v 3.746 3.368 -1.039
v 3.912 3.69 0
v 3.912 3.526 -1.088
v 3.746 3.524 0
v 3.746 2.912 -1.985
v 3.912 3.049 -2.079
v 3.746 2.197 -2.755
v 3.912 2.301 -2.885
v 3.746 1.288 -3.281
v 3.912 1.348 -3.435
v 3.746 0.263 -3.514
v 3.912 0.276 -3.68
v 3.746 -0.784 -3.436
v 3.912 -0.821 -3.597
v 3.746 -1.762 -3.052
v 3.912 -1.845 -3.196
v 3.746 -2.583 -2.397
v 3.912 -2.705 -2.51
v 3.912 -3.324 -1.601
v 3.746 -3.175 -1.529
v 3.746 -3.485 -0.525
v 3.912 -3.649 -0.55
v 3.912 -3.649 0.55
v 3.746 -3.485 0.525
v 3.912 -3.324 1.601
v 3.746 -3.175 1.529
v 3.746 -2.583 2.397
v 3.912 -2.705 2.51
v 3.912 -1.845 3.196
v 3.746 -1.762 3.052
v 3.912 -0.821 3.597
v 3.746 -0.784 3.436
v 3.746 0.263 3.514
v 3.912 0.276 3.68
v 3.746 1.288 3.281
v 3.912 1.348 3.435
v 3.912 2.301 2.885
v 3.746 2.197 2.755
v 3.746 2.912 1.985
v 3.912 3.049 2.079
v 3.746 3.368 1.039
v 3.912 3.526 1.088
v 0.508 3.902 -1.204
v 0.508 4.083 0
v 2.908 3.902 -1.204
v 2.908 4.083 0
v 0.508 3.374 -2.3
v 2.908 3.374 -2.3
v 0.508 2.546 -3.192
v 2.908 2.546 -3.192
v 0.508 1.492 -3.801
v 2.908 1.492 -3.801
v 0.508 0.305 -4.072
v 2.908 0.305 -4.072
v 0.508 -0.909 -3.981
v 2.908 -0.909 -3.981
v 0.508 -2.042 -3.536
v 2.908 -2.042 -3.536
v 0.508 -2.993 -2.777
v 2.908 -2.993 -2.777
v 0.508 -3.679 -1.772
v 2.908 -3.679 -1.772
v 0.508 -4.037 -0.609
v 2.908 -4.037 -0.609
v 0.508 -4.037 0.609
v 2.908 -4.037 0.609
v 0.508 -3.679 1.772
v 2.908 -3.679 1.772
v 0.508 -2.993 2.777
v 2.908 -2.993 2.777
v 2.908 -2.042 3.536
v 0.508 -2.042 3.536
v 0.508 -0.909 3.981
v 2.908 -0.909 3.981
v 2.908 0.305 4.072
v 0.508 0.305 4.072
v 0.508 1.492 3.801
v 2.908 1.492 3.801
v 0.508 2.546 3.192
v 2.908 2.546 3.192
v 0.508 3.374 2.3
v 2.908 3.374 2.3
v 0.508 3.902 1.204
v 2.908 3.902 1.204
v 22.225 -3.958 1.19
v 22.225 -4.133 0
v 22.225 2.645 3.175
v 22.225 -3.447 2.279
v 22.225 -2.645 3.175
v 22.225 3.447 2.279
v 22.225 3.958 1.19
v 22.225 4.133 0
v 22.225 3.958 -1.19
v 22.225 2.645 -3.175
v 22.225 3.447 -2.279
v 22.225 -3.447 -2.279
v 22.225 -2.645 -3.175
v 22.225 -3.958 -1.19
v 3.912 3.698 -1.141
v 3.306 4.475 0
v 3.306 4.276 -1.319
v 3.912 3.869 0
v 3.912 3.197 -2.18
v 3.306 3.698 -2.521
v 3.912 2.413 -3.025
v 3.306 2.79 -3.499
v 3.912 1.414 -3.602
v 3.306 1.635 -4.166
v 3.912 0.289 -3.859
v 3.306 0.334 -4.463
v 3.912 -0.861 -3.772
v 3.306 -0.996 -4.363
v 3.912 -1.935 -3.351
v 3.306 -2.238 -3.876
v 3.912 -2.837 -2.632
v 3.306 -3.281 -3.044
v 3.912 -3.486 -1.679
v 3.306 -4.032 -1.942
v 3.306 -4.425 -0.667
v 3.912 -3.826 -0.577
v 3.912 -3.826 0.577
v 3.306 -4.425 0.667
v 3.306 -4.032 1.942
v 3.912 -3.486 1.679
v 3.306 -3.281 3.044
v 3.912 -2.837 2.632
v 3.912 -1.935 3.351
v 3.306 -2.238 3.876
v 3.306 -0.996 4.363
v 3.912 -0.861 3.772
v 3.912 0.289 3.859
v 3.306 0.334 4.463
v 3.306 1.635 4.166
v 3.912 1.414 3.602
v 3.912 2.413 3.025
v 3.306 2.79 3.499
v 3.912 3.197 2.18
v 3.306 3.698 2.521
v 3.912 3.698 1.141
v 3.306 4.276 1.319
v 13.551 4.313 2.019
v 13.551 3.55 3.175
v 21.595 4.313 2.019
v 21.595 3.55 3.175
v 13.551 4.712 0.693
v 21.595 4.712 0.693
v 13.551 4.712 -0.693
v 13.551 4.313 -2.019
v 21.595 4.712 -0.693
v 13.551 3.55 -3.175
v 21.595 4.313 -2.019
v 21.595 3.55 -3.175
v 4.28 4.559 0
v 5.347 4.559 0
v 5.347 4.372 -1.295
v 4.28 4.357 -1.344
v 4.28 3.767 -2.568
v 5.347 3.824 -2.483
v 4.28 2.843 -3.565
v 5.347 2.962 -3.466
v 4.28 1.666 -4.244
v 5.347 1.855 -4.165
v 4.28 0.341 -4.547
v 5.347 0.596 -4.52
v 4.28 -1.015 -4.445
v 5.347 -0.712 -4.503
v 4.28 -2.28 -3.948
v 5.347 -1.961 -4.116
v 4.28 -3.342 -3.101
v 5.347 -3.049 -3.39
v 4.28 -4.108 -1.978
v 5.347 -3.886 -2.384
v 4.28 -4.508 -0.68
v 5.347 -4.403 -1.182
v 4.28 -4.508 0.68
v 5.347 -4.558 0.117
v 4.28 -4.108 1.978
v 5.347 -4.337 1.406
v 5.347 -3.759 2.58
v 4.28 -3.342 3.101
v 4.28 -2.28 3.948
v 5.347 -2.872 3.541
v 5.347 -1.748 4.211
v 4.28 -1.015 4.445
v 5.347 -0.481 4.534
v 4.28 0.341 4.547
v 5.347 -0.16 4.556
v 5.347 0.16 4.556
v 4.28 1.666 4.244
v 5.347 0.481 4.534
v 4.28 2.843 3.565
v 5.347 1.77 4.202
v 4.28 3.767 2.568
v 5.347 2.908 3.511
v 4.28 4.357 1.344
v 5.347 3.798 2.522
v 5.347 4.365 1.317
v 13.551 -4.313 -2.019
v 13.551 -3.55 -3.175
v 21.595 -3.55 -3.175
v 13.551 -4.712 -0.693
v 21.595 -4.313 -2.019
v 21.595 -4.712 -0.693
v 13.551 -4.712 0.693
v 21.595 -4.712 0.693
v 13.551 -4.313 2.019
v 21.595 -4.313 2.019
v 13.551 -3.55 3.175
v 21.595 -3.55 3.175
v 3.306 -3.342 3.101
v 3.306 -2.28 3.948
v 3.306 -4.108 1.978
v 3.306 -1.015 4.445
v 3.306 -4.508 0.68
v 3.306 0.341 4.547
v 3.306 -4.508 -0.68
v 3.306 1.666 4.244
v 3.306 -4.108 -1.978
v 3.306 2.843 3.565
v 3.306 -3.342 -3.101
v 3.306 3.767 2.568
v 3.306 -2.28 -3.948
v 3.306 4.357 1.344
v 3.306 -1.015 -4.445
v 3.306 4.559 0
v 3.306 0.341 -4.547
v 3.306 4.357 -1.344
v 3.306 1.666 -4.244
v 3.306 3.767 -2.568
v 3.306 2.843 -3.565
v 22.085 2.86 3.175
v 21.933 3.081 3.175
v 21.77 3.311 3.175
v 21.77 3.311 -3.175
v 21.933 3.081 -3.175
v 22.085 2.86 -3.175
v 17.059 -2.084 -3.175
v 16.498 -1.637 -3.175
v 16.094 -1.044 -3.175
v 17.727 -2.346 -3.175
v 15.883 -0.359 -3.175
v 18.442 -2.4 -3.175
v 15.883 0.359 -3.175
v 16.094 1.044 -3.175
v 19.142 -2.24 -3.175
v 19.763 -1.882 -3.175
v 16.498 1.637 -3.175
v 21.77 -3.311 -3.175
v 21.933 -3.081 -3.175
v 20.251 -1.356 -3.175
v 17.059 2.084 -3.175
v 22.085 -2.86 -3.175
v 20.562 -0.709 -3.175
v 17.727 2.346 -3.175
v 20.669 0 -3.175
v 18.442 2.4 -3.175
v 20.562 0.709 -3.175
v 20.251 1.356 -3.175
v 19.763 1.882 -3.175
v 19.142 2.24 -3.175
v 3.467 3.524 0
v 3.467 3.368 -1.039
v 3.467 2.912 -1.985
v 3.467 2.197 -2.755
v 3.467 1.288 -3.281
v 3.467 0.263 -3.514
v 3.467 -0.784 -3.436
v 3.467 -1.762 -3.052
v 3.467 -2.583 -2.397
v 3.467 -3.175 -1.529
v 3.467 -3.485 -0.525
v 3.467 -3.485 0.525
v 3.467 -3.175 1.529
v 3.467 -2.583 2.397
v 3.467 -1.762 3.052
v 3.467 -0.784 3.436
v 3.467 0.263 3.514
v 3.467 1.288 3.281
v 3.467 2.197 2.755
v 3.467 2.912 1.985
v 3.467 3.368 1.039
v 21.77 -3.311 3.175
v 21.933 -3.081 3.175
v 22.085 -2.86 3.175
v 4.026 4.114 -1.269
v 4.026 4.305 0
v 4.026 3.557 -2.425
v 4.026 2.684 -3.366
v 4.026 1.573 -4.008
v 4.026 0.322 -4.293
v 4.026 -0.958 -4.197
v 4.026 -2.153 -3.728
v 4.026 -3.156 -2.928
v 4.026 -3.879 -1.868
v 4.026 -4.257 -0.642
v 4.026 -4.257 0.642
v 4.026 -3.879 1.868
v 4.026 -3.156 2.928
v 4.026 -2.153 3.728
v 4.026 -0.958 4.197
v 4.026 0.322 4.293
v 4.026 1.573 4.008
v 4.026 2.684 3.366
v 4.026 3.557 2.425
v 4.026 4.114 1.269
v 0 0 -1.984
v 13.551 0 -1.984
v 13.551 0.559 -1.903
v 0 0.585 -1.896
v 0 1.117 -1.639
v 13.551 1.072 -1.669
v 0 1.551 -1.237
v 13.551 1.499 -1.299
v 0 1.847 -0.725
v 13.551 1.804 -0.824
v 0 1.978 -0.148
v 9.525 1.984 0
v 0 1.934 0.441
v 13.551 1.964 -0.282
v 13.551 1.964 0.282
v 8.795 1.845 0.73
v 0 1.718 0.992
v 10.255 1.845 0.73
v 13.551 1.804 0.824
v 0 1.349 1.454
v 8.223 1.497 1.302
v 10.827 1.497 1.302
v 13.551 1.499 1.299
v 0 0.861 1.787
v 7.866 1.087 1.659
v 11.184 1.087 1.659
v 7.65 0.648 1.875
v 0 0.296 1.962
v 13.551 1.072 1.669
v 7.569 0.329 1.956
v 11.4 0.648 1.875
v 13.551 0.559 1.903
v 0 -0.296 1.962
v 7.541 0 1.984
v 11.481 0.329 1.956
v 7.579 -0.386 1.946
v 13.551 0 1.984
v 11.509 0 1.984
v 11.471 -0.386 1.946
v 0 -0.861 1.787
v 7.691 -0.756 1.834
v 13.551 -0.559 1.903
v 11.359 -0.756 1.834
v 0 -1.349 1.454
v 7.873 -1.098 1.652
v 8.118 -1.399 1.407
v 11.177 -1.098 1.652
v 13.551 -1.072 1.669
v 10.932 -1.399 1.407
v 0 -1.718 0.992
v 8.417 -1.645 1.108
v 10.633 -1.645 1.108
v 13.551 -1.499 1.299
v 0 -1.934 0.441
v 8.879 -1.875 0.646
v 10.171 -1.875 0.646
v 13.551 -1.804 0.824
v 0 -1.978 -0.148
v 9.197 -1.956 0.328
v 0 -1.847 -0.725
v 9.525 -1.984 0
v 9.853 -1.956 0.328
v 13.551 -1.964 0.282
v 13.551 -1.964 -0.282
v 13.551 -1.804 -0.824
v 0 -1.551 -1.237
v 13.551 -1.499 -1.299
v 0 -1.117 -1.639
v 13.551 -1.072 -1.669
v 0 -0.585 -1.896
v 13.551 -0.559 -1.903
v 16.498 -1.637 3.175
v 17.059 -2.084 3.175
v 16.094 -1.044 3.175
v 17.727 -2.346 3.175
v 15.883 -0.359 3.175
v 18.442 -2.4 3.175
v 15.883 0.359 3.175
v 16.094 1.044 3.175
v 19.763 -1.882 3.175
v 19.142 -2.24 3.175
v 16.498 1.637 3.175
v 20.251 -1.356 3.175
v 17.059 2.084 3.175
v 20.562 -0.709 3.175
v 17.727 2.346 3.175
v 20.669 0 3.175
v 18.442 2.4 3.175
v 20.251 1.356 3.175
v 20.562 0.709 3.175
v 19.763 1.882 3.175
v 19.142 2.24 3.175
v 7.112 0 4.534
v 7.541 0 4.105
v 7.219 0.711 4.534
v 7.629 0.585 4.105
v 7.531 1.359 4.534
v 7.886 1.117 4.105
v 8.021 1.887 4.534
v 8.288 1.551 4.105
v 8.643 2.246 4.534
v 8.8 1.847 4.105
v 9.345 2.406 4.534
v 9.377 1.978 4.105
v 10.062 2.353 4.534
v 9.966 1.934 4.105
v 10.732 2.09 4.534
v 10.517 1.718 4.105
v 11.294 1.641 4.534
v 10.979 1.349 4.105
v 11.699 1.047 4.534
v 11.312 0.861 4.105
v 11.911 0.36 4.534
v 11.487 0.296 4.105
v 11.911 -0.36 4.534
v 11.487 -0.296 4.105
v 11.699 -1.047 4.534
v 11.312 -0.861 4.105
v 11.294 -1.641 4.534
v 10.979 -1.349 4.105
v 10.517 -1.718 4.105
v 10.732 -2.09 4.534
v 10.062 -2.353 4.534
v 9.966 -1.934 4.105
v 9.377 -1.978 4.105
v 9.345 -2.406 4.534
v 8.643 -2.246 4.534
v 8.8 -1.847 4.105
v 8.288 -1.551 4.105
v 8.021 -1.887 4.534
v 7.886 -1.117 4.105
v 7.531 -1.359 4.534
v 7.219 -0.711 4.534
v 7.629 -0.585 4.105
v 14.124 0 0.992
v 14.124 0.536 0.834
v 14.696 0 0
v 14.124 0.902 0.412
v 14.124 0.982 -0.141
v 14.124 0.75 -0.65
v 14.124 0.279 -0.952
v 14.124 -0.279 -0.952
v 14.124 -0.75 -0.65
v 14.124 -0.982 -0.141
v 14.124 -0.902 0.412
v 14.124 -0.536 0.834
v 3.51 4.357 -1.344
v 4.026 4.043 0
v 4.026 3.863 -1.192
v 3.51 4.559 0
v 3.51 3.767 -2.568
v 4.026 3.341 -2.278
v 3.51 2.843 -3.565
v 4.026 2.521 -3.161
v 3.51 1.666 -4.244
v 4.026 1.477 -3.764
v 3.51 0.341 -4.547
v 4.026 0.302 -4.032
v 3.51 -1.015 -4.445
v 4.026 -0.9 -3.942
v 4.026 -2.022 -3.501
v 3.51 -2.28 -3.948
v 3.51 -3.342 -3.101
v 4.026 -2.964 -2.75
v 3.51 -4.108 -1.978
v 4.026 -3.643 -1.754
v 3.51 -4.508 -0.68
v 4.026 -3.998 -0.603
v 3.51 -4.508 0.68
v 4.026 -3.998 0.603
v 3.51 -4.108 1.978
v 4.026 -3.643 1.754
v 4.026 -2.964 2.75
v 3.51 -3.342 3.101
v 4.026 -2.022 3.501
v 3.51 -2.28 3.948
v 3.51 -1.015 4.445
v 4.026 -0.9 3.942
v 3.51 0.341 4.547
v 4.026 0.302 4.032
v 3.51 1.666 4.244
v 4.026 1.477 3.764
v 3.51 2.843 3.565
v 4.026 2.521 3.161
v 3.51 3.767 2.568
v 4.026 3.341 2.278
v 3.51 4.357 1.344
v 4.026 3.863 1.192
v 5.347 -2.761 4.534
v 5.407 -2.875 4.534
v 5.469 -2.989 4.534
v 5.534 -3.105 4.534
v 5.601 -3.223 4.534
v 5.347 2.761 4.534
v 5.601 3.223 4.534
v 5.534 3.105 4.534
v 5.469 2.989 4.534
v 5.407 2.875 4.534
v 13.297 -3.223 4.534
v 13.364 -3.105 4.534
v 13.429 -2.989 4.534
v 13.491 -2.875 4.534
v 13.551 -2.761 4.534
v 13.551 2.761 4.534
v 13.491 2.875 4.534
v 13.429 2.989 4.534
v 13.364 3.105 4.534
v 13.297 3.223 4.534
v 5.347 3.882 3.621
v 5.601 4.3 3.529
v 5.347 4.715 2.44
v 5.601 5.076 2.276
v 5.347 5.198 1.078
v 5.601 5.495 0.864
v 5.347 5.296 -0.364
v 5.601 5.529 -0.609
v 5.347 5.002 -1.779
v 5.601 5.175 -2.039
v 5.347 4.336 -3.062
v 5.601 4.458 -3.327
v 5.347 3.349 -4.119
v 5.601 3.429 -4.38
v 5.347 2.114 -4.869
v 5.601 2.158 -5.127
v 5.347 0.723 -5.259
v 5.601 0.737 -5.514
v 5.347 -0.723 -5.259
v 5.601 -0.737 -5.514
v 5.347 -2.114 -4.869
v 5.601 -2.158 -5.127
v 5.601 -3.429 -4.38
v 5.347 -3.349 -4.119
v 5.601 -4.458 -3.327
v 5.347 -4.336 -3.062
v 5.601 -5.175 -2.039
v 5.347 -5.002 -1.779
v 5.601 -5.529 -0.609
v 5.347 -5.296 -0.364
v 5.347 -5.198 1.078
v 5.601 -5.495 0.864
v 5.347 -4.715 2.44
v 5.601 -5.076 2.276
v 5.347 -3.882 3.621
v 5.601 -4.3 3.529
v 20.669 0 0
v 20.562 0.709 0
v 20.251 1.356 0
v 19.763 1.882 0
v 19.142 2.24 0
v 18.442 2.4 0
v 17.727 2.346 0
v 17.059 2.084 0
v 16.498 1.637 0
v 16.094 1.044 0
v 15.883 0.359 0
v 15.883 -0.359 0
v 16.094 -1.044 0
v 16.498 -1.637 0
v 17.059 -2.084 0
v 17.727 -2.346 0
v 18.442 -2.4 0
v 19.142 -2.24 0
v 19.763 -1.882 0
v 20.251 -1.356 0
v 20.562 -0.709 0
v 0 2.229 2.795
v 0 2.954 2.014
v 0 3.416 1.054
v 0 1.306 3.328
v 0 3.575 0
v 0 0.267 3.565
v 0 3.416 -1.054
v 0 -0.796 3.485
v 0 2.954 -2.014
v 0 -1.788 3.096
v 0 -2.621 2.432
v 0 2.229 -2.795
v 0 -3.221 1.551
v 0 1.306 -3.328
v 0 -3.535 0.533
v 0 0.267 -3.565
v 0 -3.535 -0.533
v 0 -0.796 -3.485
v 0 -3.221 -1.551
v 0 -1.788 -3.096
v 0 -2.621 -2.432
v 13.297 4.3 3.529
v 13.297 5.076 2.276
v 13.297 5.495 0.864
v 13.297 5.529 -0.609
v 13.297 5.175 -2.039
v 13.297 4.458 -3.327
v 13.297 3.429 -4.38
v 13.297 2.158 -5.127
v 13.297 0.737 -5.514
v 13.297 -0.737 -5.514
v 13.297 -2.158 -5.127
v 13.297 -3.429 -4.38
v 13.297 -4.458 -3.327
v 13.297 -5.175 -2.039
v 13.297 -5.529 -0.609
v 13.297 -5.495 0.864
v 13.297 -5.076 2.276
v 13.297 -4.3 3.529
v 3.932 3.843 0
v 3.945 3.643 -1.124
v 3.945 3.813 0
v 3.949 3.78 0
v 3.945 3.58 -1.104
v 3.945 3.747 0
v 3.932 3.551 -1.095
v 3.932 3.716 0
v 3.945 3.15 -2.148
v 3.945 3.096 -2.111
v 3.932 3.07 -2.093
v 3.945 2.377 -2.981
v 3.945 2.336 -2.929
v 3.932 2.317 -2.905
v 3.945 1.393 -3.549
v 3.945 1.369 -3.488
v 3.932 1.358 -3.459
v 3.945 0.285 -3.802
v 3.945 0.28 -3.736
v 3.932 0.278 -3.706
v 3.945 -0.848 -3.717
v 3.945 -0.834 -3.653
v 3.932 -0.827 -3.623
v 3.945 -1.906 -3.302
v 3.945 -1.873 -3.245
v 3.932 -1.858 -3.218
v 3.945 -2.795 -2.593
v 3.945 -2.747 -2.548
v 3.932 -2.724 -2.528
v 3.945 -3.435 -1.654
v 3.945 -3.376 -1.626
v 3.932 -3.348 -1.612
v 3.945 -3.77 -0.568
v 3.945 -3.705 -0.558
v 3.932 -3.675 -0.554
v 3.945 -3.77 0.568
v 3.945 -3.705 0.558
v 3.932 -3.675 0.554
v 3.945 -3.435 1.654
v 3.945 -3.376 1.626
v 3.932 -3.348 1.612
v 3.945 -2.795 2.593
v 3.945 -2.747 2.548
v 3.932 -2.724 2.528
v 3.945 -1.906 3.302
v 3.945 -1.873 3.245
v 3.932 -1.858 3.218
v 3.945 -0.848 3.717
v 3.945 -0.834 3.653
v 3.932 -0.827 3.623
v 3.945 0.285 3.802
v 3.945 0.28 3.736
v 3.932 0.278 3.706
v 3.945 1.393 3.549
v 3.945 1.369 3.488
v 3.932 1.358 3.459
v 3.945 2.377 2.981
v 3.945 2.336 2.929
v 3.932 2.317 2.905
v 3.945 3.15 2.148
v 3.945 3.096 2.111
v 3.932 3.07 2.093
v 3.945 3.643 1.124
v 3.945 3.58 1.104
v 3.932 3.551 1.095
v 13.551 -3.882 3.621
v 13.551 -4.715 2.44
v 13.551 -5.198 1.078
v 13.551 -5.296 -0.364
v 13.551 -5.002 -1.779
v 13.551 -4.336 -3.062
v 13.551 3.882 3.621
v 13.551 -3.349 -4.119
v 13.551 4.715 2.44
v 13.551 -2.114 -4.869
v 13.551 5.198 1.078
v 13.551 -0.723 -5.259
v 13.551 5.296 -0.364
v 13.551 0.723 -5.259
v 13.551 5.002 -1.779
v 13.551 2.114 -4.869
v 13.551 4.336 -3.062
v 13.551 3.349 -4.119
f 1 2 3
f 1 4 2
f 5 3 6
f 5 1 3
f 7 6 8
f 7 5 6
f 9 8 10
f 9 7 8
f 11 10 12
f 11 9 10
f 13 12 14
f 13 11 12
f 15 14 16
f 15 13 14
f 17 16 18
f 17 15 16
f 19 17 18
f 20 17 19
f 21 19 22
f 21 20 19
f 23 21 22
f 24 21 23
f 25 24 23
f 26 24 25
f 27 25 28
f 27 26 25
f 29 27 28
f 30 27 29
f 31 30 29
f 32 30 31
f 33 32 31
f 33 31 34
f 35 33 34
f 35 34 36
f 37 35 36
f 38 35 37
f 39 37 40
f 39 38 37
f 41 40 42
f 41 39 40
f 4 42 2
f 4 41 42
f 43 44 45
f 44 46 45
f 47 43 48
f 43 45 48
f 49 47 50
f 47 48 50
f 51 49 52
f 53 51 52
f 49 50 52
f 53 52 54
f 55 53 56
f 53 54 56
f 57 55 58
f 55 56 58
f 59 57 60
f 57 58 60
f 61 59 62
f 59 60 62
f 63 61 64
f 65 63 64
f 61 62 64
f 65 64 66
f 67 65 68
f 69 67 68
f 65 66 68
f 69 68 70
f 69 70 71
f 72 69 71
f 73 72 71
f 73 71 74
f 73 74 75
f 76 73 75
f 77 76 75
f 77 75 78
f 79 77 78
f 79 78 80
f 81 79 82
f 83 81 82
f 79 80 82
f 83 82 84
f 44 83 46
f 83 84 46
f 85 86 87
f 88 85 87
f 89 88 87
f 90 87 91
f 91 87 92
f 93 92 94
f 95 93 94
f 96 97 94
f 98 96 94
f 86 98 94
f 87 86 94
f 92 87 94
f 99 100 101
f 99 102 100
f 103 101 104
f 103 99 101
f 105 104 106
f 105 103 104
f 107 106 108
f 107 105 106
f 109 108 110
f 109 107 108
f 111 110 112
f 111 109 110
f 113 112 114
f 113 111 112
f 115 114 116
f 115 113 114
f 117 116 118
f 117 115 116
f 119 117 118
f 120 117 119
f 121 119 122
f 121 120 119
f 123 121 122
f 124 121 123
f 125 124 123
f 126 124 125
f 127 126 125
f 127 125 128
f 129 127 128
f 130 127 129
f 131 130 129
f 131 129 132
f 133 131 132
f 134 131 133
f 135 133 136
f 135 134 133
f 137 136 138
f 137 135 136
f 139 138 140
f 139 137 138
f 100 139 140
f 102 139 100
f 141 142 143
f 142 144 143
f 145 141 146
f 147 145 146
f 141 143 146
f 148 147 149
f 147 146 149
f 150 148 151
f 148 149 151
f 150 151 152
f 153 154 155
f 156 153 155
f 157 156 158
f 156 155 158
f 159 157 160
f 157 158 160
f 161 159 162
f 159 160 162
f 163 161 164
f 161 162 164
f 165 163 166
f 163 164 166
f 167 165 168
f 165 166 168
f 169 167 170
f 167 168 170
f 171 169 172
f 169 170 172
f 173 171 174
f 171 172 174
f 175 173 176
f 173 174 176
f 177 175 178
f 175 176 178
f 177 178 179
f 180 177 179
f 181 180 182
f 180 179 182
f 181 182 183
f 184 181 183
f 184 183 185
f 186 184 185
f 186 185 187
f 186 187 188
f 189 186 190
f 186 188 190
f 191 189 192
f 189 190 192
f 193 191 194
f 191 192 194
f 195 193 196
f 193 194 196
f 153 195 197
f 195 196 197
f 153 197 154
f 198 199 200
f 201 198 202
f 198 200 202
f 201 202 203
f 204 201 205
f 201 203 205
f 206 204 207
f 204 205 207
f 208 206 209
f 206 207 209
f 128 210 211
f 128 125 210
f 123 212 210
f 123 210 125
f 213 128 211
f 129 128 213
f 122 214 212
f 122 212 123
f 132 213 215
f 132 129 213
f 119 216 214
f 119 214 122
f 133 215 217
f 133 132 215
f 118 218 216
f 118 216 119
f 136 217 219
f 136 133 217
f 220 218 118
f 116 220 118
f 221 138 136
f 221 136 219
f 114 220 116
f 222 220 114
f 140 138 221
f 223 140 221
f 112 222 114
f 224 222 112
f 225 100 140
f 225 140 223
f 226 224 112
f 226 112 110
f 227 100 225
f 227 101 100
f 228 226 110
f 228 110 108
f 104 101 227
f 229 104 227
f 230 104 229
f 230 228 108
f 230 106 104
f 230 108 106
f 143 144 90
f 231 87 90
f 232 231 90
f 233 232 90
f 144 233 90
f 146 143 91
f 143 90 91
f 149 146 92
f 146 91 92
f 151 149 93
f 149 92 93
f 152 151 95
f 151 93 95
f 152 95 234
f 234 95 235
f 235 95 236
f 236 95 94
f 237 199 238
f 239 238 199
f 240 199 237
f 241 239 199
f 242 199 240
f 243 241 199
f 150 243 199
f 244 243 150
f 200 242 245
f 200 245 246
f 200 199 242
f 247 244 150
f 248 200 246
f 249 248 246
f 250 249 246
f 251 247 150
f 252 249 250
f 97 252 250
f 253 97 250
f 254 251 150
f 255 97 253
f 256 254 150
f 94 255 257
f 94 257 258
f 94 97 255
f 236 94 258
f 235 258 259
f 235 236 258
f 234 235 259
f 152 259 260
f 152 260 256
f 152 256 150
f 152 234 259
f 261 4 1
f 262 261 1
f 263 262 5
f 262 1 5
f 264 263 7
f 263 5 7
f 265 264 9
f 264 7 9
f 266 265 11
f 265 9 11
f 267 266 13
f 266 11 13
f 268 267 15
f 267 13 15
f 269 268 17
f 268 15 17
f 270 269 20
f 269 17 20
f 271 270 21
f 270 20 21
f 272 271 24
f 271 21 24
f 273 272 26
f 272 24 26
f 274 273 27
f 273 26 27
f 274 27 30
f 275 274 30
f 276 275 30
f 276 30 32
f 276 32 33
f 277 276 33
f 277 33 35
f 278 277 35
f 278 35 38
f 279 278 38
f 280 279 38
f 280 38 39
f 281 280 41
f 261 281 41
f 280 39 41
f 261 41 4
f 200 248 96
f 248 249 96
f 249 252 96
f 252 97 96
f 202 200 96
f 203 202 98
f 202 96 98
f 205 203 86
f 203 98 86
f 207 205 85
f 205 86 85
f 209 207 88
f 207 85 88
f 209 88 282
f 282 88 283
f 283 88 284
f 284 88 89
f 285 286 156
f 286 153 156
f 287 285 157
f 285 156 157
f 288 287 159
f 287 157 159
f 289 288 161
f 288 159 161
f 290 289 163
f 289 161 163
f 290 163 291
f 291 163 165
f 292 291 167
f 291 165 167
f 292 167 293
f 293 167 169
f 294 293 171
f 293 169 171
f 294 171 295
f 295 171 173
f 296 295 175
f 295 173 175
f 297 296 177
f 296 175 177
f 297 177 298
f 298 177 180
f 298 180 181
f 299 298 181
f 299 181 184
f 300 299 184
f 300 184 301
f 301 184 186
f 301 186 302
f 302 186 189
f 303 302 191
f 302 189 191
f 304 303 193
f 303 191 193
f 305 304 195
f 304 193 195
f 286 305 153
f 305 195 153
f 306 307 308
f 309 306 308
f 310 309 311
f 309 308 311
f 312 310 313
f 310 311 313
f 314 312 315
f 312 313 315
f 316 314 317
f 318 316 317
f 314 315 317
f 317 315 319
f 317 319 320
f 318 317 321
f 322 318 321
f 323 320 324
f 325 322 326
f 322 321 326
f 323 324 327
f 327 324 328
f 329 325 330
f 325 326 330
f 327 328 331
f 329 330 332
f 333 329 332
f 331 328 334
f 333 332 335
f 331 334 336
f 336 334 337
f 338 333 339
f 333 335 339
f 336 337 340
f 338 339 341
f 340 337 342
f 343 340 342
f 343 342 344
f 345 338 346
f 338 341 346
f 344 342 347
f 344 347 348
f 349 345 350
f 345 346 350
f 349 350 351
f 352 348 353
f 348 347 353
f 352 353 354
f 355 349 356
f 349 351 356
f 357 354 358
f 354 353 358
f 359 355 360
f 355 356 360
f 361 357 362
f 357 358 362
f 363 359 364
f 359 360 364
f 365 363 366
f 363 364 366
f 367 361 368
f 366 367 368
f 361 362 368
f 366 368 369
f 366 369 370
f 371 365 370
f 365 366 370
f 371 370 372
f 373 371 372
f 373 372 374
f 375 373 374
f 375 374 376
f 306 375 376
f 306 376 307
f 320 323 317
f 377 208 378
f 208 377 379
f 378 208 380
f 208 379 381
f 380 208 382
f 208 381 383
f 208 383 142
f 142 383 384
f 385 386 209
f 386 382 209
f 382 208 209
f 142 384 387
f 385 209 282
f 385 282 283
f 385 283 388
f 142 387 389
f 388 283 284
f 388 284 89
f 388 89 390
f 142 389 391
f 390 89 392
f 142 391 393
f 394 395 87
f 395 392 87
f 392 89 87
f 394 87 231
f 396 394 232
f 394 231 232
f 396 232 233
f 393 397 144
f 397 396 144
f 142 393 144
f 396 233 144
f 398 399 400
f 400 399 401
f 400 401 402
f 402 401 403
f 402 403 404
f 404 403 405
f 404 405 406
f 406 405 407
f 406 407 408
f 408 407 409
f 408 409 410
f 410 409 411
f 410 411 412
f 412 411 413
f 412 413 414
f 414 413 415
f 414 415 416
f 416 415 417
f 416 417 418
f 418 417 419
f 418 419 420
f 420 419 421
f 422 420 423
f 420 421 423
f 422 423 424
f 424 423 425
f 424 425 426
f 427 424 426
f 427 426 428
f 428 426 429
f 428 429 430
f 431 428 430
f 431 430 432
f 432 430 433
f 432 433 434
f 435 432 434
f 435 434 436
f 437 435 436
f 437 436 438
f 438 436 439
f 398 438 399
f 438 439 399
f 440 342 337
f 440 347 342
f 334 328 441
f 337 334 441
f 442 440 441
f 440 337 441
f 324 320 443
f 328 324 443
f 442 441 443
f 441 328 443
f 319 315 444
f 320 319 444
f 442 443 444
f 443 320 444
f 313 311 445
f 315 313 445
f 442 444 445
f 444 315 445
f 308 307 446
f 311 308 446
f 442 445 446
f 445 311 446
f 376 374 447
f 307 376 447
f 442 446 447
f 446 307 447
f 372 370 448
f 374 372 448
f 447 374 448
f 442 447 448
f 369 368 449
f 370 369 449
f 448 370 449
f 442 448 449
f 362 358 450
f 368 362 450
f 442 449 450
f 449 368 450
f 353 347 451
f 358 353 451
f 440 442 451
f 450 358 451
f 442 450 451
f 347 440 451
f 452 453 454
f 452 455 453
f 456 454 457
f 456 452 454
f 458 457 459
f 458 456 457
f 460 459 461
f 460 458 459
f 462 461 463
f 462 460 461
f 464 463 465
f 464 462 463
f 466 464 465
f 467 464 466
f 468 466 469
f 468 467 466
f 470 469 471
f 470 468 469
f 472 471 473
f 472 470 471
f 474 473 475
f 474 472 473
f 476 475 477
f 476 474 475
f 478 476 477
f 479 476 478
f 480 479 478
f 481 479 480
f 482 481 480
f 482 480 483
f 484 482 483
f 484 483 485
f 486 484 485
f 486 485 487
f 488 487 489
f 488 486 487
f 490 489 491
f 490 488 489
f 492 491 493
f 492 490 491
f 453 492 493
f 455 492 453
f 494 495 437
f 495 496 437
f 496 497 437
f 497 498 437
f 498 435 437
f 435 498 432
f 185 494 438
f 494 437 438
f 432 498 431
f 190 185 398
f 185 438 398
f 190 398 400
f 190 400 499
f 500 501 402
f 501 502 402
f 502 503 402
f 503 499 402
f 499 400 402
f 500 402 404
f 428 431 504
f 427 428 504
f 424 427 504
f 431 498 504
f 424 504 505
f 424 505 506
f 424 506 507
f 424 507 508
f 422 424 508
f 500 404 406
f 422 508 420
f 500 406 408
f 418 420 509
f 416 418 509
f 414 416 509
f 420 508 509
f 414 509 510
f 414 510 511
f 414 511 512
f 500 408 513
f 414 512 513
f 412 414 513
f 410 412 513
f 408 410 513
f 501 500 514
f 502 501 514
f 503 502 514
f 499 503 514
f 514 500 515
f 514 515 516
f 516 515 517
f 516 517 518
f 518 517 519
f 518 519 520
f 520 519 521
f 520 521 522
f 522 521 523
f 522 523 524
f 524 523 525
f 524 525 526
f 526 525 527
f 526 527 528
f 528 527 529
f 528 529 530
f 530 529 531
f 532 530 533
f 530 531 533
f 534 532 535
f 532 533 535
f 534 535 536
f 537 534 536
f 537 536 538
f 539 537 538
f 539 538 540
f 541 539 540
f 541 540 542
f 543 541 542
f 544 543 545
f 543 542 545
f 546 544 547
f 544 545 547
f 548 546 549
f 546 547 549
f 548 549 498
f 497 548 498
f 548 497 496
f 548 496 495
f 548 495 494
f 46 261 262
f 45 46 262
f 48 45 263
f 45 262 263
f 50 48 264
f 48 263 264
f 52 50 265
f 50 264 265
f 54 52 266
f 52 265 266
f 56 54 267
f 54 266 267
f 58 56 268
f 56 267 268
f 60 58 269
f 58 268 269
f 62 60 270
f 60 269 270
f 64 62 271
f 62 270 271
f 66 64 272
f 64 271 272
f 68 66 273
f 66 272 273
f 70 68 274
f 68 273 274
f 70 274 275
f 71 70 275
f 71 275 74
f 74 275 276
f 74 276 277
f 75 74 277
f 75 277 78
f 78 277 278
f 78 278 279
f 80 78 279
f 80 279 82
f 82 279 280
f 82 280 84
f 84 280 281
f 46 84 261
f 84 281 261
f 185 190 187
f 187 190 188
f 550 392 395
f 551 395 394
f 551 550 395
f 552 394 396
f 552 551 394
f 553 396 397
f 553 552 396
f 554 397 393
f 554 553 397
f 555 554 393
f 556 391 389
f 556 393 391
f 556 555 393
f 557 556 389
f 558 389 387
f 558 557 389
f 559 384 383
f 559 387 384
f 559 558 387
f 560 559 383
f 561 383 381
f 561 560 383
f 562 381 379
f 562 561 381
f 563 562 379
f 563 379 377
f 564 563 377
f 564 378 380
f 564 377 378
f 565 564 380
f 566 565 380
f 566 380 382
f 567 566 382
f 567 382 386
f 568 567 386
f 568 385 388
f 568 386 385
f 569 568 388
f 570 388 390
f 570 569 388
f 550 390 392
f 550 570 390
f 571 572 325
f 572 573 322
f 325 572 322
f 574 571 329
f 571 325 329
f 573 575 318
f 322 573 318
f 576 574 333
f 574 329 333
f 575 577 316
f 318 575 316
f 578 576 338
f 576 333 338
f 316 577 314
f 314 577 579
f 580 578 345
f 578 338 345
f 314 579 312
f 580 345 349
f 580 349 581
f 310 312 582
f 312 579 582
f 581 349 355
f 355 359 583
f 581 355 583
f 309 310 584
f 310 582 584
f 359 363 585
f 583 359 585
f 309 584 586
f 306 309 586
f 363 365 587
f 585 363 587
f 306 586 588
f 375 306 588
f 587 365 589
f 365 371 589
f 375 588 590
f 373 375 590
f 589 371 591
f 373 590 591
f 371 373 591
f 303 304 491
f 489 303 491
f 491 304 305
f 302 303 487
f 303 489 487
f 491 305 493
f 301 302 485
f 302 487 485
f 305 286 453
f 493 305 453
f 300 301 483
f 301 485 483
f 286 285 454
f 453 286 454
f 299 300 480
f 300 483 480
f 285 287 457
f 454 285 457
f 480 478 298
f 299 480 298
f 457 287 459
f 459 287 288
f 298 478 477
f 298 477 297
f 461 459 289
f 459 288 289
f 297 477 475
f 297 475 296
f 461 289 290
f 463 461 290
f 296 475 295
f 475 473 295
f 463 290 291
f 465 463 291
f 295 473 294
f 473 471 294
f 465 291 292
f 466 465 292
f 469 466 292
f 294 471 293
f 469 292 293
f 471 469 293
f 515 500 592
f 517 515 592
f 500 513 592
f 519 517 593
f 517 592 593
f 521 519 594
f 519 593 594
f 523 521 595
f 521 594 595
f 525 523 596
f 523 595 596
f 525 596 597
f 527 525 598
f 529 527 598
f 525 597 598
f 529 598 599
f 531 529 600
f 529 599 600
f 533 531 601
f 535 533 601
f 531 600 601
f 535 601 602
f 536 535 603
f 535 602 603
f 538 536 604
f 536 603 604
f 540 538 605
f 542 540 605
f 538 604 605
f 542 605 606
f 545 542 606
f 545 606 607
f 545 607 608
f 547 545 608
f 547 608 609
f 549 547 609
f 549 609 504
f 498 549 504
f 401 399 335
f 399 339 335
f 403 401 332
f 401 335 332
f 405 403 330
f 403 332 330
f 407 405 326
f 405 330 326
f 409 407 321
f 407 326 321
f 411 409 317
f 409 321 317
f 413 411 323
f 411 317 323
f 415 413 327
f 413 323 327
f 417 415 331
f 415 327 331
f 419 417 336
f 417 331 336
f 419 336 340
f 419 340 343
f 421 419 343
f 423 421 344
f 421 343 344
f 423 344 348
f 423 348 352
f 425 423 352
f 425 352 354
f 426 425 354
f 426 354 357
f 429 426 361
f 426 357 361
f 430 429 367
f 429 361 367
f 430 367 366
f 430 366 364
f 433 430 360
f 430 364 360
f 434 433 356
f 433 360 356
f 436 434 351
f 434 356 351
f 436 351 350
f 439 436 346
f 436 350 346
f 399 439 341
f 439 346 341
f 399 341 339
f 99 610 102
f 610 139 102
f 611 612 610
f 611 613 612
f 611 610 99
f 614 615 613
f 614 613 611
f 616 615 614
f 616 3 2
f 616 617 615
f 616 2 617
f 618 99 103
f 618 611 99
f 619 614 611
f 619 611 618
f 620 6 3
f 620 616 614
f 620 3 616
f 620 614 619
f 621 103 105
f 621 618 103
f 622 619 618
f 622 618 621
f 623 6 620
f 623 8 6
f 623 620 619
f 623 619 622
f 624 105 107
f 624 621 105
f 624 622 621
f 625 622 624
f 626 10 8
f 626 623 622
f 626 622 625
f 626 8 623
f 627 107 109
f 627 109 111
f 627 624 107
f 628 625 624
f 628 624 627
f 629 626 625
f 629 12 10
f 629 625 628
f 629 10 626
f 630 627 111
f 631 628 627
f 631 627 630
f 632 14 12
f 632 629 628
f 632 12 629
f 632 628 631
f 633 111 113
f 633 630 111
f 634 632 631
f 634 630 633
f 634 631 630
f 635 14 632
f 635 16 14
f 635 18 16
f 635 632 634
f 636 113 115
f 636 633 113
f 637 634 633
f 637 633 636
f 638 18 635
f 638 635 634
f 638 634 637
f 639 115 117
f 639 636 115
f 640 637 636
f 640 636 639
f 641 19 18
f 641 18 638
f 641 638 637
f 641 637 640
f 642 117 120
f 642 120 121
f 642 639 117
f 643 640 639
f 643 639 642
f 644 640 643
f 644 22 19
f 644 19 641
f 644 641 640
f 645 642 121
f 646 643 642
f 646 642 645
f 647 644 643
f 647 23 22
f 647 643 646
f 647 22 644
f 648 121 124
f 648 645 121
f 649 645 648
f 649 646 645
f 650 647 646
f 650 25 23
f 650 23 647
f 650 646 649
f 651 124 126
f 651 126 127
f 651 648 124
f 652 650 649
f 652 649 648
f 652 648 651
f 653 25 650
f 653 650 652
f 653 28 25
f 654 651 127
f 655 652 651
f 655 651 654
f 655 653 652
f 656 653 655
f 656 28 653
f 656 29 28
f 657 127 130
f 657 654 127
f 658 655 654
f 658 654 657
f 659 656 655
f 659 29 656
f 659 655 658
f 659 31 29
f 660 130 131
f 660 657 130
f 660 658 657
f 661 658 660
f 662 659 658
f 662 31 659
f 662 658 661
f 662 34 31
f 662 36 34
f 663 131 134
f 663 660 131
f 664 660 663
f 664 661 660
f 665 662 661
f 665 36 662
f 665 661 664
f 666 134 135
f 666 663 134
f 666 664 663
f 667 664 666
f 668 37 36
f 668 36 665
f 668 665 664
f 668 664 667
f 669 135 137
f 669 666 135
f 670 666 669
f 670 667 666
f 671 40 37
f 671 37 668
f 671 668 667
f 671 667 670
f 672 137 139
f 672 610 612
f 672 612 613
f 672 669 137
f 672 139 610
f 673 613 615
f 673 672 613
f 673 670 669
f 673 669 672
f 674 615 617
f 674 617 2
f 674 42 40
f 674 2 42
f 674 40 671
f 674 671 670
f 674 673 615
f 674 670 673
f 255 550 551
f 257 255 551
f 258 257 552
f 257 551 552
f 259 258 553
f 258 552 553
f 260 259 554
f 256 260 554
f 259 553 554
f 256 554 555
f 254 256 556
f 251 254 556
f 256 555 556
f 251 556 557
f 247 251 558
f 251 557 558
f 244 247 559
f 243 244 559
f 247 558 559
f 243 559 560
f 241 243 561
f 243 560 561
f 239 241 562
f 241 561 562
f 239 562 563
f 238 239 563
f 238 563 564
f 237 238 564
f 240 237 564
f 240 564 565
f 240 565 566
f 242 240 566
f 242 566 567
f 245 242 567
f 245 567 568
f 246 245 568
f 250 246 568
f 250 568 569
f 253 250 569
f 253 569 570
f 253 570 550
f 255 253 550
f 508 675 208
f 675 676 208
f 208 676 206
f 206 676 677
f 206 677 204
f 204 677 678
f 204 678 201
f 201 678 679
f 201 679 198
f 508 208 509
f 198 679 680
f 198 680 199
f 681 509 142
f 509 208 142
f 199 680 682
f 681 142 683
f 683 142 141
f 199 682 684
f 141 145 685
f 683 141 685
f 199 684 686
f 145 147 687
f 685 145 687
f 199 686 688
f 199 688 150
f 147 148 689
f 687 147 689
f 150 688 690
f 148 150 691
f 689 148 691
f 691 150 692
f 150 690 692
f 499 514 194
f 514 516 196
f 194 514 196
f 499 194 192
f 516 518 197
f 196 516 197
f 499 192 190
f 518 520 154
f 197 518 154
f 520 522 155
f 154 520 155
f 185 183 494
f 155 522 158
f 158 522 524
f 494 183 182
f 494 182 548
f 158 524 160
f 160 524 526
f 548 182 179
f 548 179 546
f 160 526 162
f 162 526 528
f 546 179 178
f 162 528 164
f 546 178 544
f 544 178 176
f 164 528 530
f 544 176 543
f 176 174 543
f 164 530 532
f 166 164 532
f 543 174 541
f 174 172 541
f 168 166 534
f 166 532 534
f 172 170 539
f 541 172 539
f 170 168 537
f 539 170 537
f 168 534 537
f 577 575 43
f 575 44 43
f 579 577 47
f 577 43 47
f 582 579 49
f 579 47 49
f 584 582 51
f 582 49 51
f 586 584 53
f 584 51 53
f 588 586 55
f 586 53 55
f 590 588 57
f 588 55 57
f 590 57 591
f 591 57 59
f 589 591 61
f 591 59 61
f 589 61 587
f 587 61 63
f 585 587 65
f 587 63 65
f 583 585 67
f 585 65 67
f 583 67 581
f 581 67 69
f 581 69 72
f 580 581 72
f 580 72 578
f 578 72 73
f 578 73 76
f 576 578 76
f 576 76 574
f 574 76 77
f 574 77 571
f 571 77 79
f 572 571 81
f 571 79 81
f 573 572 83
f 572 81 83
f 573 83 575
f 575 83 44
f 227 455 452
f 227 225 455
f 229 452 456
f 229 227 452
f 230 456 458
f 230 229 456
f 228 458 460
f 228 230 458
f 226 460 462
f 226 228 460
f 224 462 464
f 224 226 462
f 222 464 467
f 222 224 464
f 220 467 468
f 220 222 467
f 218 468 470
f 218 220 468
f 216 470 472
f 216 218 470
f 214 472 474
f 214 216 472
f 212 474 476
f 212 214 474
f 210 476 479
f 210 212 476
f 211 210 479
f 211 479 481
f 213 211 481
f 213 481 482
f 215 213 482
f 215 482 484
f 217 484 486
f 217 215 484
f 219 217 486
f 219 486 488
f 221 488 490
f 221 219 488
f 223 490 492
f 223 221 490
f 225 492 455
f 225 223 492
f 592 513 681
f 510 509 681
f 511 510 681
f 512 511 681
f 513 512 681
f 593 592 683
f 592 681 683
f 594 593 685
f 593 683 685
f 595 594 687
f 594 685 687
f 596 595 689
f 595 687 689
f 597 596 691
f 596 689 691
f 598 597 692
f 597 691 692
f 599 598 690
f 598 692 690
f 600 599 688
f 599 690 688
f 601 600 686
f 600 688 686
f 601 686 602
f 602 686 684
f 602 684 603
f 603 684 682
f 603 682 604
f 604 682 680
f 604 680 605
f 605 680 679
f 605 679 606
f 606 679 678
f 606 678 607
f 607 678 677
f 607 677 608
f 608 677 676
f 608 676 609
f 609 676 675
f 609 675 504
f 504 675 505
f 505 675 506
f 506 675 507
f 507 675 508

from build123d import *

# Parameters (mm, degrees)
SKETCH3_W               = 22.2504
SKETCH3_H               = 44.5008
SKETCH3_W_2             = 6.35
SKETCH3_H_2             = 22.2504
CUT_EXTRUDE1_DEPTH      = 8.6741
SKETCH4_W               = 5.5626
SKETCH4_H               = 11.1252
CUT_EXTRUDE2_DEPTH      = 8.2042
HOLE1_D                 = 3.96748
HOLE1_DEPTH             = 13.5509
HOLE1_TIP               = 1.145312823
HOLE2_D                 = 3.96748
HOLE2_DEPTH             = 4.5339
HOLE2_CSINK_D           = 4.826
HOLE2_CSINK_ANGLE       = 90
CUT_EXTRUDE3_DEPTH      = 4.7625
CUT_EXTRUDE3_DEPTH_BACK = 4.7625
SKETCH10_R              = 2.40665


with BuildPart() as part:
    # Sketch1 → Revolve1 (revolve)
    with BuildSketch(Plane.XY):
        Polygon((0, 0), (0, 3.57505), (0.508, 4.08305), (2.9083, 4.08305), (3.4671, 3.52425), (4.0259, 3.52425), (4.0259, 4.3053), (4.2799, 4.5593), (5.3467, 4.5593), (5.3467, 5.3086), (5.6007, 5.5626), (13.2969, 5.5626), (13.5509, 5.3086), (13.5509, 0), align=None)
    revolve(axis=Axis((13.5509, 0, 0), (-1, 0, 0)))

    # Sketch2 → Revolve2 (revolve)
    with BuildSketch(Plane.XY):
        Polygon((13.5509, 0), (13.5509, 4.7625), (21.59508, 4.7625), (22.225, 4.13258), (22.225, 0), align=None)
    revolve(axis=Axis((22.225, 0, 0), (-1, 0, 0)))

    # Sketch3 → Cut-Extrude1 (cut)
    with BuildSketch(Plane(origin=(22.225, 0, 0), x_dir=(0, 0, -1), z_dir=(1, 0, 0))):
        Rectangle(SKETCH3_W, SKETCH3_H)
        Rectangle(SKETCH3_W_2, SKETCH3_H_2, mode=Mode.SUBTRACT)
    extrude(amount=-CUT_EXTRUDE1_DEPTH, mode=Mode.SUBTRACT)

    # Sketch4 → Cut-Extrude2 (cut)
    with BuildSketch(Plane(origin=(13.5509, 0, 0), x_dir=(0, 0, -1), z_dir=(1, 0, 0))):
        with Locations((-7.3152, 0)):
            Rectangle(SKETCH4_W, SKETCH4_H)
    extrude(amount=-CUT_EXTRUDE2_DEPTH, mode=Mode.SUBTRACT)

    # Hole1
    with Locations(Plane.ZY):
        with Locations((0, 0)):
            Hole(HOLE1_D / 2, depth=HOLE1_DEPTH)
            with Locations((0, 0, -(HOLE1_DEPTH + HOLE1_TIP / 2))):  # 120° drill point
                Cone(0, HOLE1_D / 2, HOLE1_TIP, mode=Mode.SUBTRACT)

    # Hole2
    with Locations(Plane.XY.offset(4.5339)):
        with Locations((9.525, 0)):
            CounterSinkHole(HOLE2_D / 2, HOLE2_CSINK_D / 2, depth=HOLE2_DEPTH, counter_sink_angle=HOLE2_CSINK_ANGLE)

    # Sketch9 → Revolve3 (revolve)
    with BuildSketch(Plane.XY):
        with BuildLine():
            Line((3.306480735, 4.475131804), (3.912128708, 3.869483831))
            ThreePointArc((3.912128708, 3.869483831), (3.949326147, 3.779681269), (3.912128708, 3.689878708))
            Line((3.912128708, 3.689878708), (3.7465, 3.52425))
            Line((3.7465, 3.52425), (3.4671, 3.52425))
            Line((3.4671, 3.52425), (3.4671, 3.27025))
            Line((3.4671, 3.27025), (4.0259, 3.27025))
            Line((4.0259, 3.27025), (4.0259, 4.043080735))
            Line((4.0259, 4.043080735), (3.509680735, 4.5593))
            Line((3.509680735, 4.5593), (3.306480735, 4.5593))
            Line((3.306480735, 4.5593), (3.306480735, 4.475131804))
        make_face()
    revolve(axis=Axis((4.0259, 0, 0), (-1, 0, 0)))

    # Sketch10 → Cut-Extrude3 (cut, two sides: drawn at the far end of the back side and taken through both)
    with BuildSketch(Plane.XY.offset(-CUT_EXTRUDE3_DEPTH_BACK)):
        with Locations((18.2626, 0)):
            Circle(SKETCH10_R)
    extrude(amount=CUT_EXTRUDE3_DEPTH + CUT_EXTRUDE3_DEPTH_BACK, mode=Mode.SUBTRACT)


solid = part.part
